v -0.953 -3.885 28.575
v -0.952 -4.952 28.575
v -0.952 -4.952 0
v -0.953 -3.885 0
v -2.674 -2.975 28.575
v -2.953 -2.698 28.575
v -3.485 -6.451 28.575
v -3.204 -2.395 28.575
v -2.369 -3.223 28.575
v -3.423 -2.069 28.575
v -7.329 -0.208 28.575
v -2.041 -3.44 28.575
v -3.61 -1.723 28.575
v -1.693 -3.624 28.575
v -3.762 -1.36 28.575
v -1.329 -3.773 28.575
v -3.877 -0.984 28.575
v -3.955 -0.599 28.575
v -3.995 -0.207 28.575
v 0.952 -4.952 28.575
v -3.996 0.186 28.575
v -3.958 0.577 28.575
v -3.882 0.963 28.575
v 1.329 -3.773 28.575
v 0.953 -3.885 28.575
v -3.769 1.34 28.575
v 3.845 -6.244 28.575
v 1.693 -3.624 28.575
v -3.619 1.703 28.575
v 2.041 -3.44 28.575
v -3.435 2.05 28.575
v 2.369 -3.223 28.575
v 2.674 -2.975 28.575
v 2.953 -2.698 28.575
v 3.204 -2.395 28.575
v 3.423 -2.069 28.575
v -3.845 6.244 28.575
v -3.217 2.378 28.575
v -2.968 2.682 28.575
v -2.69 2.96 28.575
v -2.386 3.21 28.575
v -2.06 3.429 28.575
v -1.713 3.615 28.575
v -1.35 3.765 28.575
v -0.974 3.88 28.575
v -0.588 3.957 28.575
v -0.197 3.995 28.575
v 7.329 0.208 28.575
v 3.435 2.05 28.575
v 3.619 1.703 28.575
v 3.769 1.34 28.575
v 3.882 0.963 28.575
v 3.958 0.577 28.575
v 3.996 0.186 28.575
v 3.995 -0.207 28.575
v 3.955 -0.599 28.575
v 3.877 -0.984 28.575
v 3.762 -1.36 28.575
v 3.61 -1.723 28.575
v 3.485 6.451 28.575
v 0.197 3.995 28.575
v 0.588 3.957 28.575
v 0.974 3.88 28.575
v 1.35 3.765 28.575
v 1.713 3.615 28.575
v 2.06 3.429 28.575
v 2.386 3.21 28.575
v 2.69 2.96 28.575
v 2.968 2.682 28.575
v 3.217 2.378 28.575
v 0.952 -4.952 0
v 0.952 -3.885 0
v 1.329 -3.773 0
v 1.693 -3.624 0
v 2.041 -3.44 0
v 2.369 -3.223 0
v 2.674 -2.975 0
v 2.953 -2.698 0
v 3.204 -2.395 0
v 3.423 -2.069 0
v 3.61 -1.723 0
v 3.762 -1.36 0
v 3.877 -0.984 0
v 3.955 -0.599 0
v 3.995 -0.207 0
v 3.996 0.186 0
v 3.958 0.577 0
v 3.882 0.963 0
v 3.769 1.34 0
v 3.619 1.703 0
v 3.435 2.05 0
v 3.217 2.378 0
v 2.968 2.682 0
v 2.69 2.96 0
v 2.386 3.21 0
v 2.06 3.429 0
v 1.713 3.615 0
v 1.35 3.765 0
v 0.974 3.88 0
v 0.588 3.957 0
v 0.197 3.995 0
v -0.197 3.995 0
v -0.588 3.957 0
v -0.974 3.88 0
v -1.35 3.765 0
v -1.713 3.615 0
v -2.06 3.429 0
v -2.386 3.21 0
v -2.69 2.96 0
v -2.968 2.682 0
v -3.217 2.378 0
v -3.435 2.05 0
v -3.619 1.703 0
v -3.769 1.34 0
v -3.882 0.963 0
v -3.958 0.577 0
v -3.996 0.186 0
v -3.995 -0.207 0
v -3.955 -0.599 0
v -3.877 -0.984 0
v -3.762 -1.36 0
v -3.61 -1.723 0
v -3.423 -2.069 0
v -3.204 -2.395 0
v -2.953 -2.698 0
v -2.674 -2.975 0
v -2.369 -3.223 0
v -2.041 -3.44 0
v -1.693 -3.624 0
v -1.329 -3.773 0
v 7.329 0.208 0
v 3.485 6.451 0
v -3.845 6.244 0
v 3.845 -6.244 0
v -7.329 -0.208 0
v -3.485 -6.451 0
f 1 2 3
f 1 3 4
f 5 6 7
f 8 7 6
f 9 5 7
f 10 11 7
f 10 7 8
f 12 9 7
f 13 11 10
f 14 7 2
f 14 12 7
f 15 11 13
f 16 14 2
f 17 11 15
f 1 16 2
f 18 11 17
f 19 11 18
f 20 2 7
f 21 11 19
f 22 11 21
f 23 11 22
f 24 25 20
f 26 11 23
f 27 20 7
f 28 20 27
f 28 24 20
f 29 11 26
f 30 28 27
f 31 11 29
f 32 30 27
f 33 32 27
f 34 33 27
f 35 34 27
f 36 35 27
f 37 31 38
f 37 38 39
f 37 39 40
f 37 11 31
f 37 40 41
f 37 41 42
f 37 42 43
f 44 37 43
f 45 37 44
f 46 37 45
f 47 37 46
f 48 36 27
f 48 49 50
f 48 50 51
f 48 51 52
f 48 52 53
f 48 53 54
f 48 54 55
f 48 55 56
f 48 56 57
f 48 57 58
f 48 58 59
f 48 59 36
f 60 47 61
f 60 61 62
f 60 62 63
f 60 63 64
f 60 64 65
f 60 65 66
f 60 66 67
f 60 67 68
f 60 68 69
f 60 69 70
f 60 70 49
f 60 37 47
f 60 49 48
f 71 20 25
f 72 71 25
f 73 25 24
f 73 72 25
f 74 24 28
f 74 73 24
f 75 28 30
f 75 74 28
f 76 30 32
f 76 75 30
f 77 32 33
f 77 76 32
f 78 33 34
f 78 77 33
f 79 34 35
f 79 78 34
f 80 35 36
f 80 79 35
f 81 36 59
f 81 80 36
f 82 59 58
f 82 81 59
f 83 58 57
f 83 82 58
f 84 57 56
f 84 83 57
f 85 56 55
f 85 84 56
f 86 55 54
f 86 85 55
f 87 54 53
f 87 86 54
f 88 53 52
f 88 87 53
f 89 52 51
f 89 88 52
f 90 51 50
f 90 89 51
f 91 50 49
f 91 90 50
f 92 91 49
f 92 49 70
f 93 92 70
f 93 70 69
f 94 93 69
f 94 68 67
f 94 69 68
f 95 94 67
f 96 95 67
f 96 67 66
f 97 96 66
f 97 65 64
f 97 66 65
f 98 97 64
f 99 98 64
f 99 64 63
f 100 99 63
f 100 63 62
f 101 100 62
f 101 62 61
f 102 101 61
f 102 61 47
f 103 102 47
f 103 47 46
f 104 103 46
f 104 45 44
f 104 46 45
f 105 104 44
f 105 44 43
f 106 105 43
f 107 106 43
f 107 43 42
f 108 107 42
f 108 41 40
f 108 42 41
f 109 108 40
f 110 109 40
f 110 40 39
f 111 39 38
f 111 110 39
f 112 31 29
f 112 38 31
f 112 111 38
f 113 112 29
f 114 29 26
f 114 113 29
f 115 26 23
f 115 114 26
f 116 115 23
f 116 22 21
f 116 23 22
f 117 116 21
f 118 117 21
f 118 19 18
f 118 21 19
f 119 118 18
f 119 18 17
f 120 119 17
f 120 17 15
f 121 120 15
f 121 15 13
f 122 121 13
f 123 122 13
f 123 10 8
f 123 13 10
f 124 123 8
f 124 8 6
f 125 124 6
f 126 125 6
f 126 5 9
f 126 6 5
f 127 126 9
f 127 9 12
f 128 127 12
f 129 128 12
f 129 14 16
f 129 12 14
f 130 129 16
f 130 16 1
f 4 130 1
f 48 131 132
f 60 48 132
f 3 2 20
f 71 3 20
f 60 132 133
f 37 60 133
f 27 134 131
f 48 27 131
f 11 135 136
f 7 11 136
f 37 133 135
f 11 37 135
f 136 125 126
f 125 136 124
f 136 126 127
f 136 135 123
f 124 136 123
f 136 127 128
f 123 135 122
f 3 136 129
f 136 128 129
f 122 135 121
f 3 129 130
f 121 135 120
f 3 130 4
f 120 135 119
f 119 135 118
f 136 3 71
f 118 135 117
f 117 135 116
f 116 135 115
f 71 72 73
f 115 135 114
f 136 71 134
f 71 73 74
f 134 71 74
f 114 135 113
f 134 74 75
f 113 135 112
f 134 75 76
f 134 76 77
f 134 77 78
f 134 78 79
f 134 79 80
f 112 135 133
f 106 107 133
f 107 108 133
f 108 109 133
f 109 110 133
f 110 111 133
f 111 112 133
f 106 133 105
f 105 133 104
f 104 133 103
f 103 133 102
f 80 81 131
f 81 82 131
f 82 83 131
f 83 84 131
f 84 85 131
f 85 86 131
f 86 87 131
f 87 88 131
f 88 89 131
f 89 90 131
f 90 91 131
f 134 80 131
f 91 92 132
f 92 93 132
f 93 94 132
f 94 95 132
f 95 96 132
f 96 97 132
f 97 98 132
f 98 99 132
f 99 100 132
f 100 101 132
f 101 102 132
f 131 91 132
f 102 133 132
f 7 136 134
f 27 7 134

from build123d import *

# Parameters (mm, degrees)
SKETCH1_R           = 4
BOSS_EXTRUDE1_DEPTH = 28.575
SKETCH2_W           = 1.905
SKETCH2_H           = 1.905
CUT_EXTRUDE1_DEPTH  = 29.575


with BuildPart() as part:
    # Sketch1 → Boss-Extrude1 (new body)
    with BuildSketch(Plane.XY):
        Polygon((-7.329405666, -0.20771595), (-3.484815544, -6.451309476), (3.844590123, -6.243593526), (7.329405666, 0.20771595), (3.484815544, 6.451309476), (-3.844590123, 6.243593526), align=None)
        Circle(SKETCH1_R, mode=Mode.SUBTRACT)
    extrude(amount=BOSS_EXTRUDE1_DEPTH)

    # Sketch2 → Cut-Extrude1 (cut, through all)
    with BuildSketch(Plane.XY.offset(28.575)):
        with Locations((0, -4)):
            Rectangle(SKETCH2_W, SKETCH2_H)
    extrude(amount=-CUT_EXTRUDE1_DEPTH, mode=Mode.SUBTRACT)


solid = part.part
